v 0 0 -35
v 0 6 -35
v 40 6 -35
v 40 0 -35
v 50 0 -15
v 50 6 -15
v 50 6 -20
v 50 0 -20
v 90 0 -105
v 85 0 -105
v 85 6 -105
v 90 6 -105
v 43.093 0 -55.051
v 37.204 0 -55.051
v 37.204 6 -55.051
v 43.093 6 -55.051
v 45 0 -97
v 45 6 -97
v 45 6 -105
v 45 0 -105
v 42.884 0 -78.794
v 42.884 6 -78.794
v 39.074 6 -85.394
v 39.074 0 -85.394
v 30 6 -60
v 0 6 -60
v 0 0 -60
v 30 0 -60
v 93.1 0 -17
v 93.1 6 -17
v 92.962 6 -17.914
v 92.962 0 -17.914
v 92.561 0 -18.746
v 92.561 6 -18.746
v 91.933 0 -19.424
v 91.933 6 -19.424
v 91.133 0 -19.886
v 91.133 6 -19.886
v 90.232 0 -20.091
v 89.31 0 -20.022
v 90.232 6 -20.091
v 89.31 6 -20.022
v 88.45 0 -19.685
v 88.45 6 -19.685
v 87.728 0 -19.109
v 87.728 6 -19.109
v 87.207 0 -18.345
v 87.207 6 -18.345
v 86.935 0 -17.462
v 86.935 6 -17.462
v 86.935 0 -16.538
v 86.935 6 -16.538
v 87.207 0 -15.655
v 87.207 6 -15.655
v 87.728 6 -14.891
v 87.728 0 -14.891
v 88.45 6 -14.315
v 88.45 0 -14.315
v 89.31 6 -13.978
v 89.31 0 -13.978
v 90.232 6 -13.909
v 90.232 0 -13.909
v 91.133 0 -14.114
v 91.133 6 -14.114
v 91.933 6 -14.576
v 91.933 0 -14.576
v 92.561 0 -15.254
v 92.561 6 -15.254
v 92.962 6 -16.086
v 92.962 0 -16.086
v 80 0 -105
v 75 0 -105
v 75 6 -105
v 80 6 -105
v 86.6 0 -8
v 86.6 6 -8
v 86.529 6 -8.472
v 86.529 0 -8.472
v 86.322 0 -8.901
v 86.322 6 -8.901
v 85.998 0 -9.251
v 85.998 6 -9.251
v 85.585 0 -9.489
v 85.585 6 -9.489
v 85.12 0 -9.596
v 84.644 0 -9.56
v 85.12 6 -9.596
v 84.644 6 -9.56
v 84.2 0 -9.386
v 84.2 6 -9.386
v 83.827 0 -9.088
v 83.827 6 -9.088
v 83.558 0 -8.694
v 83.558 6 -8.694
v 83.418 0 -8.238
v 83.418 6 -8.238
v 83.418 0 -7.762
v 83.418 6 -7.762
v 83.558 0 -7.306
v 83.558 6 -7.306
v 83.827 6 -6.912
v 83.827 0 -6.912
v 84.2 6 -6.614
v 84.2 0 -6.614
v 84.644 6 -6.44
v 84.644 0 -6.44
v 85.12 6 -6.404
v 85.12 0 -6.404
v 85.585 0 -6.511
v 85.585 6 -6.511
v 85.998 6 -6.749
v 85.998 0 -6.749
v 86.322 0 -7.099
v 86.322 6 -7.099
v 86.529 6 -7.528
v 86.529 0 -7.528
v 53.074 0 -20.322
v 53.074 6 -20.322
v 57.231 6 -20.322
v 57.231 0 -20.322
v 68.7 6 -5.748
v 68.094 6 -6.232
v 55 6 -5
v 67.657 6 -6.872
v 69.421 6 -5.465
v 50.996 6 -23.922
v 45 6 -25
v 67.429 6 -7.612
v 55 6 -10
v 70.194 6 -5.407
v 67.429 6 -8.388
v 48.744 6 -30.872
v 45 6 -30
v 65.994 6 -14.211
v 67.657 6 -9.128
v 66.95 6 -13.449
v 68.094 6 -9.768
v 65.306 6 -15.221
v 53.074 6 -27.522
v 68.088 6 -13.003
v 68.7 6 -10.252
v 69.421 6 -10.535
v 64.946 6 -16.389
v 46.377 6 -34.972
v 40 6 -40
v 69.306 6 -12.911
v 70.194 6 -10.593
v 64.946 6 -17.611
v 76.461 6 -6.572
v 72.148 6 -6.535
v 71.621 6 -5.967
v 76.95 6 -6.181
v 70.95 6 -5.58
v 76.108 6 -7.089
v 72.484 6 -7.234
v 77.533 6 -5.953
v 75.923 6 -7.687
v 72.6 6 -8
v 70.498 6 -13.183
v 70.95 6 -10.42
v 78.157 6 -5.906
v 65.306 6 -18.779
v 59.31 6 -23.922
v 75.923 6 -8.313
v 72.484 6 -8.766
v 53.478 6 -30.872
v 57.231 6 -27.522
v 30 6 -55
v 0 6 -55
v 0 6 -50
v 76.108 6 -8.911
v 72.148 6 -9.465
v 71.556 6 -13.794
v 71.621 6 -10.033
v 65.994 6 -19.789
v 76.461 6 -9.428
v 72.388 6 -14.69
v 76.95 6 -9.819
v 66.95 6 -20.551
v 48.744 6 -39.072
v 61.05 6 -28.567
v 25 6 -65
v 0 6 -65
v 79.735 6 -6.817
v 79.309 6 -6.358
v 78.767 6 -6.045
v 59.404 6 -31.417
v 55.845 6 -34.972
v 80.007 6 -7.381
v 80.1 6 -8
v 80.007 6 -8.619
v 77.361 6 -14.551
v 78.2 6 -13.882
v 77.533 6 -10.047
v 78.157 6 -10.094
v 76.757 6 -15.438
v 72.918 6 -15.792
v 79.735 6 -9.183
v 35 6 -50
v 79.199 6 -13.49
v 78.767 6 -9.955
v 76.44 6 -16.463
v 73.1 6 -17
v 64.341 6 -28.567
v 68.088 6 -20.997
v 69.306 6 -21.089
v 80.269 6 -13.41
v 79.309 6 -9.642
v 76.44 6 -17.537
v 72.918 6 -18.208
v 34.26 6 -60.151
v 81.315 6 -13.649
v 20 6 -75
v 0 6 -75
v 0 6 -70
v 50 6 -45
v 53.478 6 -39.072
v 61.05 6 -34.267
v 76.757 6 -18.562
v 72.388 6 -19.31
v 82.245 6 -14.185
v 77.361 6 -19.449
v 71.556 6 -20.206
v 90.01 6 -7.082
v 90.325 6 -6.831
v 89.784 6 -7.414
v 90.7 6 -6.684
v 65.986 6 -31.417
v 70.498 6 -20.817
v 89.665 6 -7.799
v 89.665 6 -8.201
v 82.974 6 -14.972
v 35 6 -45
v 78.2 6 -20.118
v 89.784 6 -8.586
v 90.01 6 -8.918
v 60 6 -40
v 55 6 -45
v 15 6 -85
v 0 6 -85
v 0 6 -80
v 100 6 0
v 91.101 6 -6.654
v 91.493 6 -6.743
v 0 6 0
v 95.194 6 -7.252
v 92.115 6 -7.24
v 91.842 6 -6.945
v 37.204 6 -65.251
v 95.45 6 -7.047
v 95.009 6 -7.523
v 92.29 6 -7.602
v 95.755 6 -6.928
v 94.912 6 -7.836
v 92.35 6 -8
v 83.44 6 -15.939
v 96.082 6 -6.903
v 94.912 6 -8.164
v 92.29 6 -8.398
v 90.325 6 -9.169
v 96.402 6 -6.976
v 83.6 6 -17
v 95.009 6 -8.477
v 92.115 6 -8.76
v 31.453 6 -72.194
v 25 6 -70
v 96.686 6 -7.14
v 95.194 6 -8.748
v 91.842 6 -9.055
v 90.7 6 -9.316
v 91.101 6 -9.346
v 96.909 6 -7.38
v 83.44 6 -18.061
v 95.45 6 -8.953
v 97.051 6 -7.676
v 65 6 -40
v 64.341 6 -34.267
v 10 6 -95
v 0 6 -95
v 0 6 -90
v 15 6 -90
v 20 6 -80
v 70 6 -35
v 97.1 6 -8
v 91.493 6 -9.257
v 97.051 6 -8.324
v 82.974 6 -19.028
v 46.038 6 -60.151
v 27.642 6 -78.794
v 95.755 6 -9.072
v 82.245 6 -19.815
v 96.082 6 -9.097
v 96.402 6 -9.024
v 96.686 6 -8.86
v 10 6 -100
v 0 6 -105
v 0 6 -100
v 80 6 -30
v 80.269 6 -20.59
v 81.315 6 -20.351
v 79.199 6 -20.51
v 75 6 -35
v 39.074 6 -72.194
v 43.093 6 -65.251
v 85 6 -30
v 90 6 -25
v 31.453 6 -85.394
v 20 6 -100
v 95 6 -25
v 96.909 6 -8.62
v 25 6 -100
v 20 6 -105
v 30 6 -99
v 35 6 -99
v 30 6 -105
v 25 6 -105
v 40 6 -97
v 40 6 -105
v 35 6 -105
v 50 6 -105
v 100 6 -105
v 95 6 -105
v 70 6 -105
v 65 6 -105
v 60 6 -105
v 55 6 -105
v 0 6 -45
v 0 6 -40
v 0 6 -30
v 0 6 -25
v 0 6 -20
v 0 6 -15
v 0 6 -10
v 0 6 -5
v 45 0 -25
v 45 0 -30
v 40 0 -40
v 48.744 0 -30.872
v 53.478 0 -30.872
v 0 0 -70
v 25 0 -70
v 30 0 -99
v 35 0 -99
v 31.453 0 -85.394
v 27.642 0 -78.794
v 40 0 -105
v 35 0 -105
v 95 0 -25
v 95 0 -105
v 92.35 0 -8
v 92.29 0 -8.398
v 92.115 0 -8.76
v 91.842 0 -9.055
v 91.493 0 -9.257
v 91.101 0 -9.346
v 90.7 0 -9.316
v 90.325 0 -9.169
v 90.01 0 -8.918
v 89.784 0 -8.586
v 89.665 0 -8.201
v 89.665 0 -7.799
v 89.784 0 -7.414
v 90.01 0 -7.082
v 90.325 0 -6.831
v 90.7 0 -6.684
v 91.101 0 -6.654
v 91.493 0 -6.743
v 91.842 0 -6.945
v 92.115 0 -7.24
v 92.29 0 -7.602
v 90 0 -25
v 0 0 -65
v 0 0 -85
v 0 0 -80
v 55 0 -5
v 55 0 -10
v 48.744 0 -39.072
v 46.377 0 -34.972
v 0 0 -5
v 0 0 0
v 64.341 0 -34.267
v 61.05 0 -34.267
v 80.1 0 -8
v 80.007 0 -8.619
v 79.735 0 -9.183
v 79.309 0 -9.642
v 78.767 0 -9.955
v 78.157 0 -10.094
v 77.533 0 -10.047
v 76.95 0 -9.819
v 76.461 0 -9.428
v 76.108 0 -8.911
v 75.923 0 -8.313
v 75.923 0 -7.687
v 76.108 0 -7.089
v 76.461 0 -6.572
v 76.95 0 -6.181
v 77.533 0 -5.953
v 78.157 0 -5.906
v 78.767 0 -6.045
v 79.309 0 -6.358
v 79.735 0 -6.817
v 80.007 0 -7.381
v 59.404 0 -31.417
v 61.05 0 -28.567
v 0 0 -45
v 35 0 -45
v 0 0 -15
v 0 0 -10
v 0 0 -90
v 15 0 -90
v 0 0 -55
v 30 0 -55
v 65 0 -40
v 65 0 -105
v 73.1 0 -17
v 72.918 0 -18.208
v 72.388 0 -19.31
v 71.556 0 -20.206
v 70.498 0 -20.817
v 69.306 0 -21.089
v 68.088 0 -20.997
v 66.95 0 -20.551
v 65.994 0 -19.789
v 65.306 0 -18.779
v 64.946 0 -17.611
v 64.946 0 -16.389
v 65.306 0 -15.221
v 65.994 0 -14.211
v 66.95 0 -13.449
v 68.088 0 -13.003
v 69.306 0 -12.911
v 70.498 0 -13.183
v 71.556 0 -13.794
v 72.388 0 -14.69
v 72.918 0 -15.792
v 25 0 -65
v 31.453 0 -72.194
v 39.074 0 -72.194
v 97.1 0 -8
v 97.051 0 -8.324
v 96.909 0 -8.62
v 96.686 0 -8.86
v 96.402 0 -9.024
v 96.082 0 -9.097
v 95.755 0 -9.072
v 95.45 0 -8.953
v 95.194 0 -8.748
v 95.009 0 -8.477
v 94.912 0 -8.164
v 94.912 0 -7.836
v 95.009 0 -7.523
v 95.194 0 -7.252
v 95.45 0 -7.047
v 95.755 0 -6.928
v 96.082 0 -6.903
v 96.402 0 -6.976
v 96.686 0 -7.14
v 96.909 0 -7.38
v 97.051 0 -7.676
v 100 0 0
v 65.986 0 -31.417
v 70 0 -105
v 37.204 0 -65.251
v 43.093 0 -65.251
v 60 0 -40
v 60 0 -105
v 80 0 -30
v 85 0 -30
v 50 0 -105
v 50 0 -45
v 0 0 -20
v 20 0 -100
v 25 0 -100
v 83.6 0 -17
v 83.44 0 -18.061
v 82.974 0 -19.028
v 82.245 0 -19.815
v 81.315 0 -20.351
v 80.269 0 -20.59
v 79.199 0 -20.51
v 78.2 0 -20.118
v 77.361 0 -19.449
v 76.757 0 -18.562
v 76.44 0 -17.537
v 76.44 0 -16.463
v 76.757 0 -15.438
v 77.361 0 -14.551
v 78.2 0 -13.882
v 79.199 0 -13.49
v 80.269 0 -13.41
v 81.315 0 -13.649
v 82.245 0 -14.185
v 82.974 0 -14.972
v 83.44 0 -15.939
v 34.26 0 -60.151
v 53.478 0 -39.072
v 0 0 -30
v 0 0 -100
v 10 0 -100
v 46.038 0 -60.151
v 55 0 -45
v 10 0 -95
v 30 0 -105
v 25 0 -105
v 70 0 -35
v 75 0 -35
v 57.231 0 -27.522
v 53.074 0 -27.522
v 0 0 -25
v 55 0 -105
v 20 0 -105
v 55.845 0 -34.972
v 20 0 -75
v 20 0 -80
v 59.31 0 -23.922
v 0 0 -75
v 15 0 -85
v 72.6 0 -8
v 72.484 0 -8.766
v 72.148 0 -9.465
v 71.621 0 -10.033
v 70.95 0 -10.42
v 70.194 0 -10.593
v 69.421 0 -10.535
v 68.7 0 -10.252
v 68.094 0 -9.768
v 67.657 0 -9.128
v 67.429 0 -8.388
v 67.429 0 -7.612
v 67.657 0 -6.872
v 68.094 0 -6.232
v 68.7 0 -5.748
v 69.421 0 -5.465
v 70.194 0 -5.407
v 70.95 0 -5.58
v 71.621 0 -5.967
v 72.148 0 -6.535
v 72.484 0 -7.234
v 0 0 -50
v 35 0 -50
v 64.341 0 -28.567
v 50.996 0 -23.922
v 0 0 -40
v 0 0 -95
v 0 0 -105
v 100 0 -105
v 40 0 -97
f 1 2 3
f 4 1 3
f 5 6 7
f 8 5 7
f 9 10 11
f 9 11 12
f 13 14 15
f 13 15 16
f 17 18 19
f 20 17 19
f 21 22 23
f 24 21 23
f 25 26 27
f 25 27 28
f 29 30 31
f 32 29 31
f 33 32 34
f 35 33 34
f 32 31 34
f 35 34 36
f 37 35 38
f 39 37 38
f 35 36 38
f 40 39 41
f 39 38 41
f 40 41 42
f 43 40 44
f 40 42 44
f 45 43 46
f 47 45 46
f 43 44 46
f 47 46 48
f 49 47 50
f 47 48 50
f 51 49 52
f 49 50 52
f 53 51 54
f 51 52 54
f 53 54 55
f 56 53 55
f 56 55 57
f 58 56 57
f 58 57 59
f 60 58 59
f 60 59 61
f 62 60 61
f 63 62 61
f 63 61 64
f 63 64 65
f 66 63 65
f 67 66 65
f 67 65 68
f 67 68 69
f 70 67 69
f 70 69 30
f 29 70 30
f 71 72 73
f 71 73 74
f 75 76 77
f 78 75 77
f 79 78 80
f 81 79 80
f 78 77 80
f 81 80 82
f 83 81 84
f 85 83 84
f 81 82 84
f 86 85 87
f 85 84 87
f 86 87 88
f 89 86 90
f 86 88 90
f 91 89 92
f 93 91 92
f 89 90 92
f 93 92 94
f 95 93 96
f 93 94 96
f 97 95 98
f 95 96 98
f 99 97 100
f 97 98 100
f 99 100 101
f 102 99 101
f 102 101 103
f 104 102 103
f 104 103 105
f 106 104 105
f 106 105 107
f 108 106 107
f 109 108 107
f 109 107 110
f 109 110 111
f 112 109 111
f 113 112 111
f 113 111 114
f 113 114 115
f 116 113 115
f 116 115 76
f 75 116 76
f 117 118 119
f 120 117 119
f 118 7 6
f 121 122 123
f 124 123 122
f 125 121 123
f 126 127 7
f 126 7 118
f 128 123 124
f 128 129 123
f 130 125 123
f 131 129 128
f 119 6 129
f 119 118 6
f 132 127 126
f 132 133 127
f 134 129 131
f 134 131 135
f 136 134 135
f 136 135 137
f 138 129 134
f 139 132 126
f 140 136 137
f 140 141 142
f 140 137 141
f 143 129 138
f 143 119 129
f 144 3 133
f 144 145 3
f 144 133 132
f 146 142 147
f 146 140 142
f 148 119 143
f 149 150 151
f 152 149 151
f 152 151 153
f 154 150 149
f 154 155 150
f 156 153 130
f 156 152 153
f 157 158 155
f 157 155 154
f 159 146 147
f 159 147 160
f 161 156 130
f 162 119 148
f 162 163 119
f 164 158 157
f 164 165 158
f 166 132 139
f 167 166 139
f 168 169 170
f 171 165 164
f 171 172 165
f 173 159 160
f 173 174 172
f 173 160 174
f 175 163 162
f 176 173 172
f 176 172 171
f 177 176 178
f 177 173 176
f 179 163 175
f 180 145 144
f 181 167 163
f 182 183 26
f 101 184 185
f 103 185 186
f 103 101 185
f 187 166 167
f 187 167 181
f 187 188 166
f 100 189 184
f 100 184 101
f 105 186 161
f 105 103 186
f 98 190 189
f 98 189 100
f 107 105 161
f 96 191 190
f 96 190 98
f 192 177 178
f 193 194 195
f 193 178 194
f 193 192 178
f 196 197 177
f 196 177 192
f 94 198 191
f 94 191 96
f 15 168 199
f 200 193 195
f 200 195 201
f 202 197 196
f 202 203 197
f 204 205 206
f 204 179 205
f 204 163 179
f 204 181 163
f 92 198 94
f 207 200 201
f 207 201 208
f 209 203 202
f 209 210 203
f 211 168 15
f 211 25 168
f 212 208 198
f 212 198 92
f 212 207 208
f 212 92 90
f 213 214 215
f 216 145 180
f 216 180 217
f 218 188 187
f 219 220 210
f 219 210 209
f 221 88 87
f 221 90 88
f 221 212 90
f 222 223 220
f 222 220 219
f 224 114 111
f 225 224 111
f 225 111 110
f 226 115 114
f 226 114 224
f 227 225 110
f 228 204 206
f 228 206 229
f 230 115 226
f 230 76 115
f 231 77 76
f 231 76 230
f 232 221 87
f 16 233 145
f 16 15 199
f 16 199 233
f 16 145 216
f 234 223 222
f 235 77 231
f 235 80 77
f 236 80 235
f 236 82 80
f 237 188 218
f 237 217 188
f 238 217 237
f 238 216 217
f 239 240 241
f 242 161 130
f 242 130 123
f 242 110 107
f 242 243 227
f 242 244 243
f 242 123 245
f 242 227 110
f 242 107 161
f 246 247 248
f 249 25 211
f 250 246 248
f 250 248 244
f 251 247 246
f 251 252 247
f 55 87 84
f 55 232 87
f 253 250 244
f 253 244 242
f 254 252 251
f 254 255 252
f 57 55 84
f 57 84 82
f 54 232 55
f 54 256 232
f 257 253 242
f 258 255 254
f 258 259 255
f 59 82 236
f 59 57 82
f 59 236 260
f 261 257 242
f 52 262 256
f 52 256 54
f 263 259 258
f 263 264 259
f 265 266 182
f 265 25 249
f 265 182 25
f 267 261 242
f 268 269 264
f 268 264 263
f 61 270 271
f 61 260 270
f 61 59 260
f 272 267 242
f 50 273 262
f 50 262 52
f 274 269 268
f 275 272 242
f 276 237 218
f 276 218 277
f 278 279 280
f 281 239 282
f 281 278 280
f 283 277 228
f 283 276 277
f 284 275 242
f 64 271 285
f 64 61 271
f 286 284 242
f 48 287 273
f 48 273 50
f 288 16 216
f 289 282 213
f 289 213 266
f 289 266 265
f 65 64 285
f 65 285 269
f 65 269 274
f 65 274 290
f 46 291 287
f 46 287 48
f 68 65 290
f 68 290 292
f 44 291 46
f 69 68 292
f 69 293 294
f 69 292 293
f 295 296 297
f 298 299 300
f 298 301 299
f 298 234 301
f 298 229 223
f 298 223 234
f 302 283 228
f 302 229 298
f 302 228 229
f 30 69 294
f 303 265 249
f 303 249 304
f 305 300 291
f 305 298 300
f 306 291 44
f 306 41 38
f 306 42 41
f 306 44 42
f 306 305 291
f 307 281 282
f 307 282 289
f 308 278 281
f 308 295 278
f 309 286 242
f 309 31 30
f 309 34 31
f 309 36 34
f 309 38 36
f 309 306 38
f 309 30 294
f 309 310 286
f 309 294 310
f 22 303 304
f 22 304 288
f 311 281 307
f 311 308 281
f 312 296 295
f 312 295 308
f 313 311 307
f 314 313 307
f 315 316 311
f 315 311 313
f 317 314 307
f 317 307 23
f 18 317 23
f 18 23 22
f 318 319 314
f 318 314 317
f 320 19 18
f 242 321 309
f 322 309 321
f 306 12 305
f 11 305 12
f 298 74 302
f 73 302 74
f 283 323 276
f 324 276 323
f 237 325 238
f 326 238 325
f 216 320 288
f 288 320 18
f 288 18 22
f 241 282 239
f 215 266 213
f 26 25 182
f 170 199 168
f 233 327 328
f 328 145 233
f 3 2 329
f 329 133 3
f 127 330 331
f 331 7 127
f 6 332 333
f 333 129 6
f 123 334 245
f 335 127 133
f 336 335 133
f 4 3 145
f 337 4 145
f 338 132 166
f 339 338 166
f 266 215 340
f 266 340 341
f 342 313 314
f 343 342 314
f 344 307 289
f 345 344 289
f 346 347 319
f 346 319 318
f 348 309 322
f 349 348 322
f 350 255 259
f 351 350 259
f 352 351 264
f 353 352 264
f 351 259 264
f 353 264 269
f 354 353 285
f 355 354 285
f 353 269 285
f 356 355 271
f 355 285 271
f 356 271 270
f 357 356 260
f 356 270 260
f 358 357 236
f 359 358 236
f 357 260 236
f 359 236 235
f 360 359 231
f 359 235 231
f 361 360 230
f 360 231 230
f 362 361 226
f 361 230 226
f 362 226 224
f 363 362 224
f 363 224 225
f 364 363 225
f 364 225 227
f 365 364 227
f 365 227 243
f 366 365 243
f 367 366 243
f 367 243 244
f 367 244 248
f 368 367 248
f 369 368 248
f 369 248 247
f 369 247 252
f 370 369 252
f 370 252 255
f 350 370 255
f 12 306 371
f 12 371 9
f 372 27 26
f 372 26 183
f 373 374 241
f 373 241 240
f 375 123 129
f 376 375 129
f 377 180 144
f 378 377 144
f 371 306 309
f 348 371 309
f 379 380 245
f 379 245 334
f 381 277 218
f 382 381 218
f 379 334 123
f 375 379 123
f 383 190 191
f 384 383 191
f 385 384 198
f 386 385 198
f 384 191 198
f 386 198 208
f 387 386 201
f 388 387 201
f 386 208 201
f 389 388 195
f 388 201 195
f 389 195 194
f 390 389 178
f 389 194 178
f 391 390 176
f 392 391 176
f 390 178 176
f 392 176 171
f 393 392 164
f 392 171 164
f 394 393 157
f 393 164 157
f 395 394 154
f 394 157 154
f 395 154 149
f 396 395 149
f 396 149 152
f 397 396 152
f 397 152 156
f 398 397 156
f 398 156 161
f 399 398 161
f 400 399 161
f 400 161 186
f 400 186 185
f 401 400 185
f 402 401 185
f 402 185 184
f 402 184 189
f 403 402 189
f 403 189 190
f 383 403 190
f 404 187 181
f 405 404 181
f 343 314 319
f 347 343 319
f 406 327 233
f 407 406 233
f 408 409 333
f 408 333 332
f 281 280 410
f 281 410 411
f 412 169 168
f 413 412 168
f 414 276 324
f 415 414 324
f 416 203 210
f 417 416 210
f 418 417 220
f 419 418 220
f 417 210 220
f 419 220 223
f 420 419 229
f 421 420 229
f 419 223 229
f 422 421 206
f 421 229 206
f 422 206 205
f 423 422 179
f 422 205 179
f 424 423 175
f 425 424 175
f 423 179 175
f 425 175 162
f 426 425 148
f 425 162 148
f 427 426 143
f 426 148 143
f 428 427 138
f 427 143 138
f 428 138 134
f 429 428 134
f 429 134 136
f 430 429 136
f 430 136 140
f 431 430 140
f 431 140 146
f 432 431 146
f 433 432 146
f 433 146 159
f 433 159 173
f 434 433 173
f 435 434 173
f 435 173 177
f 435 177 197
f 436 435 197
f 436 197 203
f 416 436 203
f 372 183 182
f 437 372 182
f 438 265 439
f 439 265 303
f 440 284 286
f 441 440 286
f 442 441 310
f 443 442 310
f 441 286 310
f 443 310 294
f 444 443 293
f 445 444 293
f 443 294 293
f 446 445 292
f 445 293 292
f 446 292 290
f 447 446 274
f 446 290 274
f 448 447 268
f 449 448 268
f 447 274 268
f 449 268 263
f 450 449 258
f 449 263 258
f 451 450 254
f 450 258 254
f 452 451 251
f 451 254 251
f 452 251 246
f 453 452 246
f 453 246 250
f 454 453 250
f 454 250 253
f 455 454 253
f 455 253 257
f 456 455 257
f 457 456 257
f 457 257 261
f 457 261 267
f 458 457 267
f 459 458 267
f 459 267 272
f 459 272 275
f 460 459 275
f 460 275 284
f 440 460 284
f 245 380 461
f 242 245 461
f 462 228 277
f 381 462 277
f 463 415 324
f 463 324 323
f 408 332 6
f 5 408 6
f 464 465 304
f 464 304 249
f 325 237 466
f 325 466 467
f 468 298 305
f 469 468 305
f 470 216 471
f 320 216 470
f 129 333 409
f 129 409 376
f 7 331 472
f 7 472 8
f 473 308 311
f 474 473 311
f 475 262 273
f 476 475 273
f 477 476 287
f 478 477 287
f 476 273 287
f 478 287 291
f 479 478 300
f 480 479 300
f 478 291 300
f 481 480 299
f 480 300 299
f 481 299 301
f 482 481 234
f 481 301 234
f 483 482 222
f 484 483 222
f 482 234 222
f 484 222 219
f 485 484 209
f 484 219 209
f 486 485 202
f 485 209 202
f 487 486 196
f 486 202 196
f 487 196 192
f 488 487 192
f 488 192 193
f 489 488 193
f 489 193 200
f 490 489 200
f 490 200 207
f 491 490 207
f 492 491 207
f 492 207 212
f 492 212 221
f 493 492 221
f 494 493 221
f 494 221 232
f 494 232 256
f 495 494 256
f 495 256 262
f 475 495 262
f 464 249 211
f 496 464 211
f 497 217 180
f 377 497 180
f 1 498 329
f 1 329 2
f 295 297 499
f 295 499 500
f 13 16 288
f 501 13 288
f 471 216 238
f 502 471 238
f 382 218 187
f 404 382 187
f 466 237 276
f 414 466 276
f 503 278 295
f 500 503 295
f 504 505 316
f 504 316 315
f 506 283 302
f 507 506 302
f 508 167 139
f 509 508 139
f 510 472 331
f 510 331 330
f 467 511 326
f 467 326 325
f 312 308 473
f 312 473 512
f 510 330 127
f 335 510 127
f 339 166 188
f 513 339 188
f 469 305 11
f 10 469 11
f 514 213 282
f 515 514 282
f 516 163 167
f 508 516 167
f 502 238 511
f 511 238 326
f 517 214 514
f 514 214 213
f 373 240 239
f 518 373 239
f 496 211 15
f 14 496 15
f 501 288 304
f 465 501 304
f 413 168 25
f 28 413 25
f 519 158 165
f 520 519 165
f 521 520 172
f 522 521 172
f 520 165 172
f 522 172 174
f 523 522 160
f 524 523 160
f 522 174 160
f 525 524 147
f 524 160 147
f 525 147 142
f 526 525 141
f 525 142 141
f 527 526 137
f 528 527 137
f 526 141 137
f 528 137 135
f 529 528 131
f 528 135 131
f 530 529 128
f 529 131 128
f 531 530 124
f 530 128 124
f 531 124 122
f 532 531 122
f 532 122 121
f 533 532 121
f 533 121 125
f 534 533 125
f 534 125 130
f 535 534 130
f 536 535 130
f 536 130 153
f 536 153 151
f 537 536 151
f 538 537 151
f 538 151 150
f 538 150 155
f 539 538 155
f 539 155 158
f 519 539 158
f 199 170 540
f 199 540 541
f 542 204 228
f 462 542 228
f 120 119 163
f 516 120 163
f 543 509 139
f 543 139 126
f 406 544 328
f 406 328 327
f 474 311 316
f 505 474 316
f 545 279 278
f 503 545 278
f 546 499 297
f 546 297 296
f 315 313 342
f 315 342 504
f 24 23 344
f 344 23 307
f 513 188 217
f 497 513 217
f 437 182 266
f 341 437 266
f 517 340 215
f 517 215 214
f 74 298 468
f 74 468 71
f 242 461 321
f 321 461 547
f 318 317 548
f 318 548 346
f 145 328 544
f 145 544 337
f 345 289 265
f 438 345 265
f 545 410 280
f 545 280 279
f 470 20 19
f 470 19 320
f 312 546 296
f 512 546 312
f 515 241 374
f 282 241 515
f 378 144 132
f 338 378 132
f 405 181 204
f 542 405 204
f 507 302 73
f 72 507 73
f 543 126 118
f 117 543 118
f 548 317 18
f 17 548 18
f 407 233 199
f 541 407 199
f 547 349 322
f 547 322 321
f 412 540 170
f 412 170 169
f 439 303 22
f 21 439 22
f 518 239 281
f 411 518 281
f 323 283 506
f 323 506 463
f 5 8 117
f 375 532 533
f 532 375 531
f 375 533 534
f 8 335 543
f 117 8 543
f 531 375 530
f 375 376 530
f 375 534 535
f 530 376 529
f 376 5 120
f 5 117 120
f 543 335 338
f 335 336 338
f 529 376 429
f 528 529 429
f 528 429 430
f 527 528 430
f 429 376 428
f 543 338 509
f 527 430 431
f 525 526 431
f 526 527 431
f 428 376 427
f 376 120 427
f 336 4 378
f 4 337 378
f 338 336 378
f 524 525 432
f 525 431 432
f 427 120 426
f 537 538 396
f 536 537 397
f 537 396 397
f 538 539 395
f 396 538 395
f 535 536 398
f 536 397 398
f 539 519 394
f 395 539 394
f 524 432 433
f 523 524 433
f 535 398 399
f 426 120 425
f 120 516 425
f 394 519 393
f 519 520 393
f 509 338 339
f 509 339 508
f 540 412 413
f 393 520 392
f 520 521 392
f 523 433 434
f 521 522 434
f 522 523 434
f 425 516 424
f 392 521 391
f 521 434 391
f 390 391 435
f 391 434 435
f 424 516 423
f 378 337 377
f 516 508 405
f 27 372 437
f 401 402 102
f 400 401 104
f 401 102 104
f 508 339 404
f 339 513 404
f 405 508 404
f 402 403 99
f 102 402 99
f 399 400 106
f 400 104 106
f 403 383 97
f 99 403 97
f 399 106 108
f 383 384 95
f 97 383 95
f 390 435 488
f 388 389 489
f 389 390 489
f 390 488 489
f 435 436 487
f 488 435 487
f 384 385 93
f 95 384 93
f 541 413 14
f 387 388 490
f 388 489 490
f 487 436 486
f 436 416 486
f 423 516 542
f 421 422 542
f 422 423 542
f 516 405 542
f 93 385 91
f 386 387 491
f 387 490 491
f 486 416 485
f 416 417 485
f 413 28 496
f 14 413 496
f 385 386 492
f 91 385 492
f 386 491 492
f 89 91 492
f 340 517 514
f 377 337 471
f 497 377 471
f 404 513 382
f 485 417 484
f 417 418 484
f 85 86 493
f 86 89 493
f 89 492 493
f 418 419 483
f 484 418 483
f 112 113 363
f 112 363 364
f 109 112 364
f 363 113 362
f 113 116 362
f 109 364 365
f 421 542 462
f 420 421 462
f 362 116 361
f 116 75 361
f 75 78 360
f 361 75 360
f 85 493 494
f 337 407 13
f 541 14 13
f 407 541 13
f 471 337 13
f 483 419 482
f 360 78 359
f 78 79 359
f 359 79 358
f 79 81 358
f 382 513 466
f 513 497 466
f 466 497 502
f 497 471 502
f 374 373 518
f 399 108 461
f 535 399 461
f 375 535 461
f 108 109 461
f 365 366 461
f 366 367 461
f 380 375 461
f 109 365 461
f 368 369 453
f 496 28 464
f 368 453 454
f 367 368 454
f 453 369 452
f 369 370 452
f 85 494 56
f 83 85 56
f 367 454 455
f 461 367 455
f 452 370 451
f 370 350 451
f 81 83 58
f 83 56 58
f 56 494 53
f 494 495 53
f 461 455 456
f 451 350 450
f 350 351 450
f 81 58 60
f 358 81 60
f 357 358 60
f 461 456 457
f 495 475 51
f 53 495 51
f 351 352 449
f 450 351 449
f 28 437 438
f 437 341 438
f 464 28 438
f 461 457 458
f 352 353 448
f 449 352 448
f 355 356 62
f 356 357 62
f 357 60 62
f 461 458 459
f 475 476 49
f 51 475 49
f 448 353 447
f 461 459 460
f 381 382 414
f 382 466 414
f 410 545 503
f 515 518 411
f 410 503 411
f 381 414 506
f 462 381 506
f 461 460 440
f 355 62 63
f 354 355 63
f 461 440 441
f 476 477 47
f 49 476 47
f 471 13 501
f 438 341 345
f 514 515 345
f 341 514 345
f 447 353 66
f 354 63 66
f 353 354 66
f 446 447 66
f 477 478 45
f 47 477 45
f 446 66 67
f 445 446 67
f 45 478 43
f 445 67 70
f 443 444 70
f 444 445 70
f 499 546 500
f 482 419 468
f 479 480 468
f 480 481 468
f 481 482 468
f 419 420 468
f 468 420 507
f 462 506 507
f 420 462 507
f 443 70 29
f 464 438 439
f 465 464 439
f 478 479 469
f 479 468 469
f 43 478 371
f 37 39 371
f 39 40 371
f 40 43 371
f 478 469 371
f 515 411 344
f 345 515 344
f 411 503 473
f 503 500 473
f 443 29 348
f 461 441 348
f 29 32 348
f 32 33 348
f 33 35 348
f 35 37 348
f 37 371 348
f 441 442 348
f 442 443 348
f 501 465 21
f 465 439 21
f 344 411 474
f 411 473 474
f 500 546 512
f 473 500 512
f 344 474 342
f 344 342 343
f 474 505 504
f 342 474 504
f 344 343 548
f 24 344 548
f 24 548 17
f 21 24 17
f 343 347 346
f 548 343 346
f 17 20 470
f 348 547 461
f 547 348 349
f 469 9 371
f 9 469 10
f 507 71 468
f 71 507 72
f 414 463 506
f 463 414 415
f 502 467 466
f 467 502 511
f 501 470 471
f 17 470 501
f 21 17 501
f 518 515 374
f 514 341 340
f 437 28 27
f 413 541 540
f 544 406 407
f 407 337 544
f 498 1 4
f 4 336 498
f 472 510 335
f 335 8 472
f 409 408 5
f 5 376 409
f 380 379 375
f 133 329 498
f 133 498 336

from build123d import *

# Parameters (mm, degrees)
SKETCH1_W           = 100
SKETCH1_H           = 105
BOSS_EXTRUDE1_DEPTH = 6
SKETCH3_W           = 10
SKETCH3_H           = 5
SKETCH3_W_2         = 15
SKETCH3_W_3         = 20
SKETCH3_W_4         = 25
SKETCH3_W_5         = 30
SKETCH3_W_6         = 35
SKETCH3_W_7         = 40
SKETCH3_W_8         = 45
SKETCH3_W_9         = 50
SKETCH3_W_10        = 55
CUT_EXTRUDE1_DEPTH  = 6
SKETCH4_W           = 5
SKETCH4_H           = 80
SKETCH4_H_2         = 75
SKETCH4_H_3         = 70
SKETCH4_H_4         = 65
SKETCH4_H_5         = 60
CUT_EXTRUDE2_DEPTH  = 6
SKETCH5_R           = 1.35
SKETCH5_R_2         = 1.6
SKETCH5_R_3         = 2.1
SKETCH5_R_4         = 2.6
SKETCH5_R_5         = 1.1
SKETCH5_R_6         = 3.1
SKETCH5_R_7         = 3.6
SKETCH5_R_8         = 4.1
CUT_EXTRUDE3_DEPTH  = 7
SKETCH7_W           = 5
SKETCH7_H           = 5
SKETCH7_H_2         = 6
SKETCH7_H_3         = 8
CUT_EXTRUDE4_DEPTH  = 7
CUT_EXTRUDE5_DEPTH  = 7


with BuildPart() as part:
    # Sketch1 → Boss-Extrude1 (new body)
    with BuildSketch(Plane(origin=(0, 0, 0), x_dir=(1, 0, 0), z_dir=(0, 1, 0))):
        with Locations((50, 52.5)):
            Rectangle(SKETCH1_W, SKETCH1_H)
    extrude(amount=BOSS_EXTRUDE1_DEPTH)

    # Sketch3 → Cut-Extrude1 (cut)
    with BuildSketch(Plane(origin=(0, 6, 0), x_dir=(1, 0, 0), z_dir=(0, 1, 0))):
        with Locations((5, 97.5)):
            Rectangle(SKETCH3_W, SKETCH3_H)
        with Locations((7.5, 87.5)):
            Rectangle(SKETCH3_W_2, SKETCH3_H)
        with Locations((10, 77.5)):
            Rectangle(SKETCH3_W_3, SKETCH3_H)
        with Locations((12.5, 67.5)):
            Rectangle(SKETCH3_W_4, SKETCH3_H)
        with Locations((15, 57.5)):
            Rectangle(SKETCH3_W_5, SKETCH3_H)
        with Locations((17.5, 47.5)):
            Rectangle(SKETCH3_W_6, SKETCH3_H)
        with Locations((20, 37.5)):
            Rectangle(SKETCH3_W_7, SKETCH3_H)
        with Locations((22.5, 27.5)):
            Rectangle(SKETCH3_W_8, SKETCH3_H)
        with Locations((25, 17.5)):
            Rectangle(SKETCH3_W_9, SKETCH3_H)
        with Locations((27.5, 7.5)):
            Rectangle(SKETCH3_W_10, SKETCH3_H)
    extrude(amount=-CUT_EXTRUDE1_DEPTH, mode=Mode.SUBTRACT)

    # Sketch4 → Cut-Extrude2 (cut)
    with BuildSketch(Plane(origin=(0, 6, 0), x_dir=(1, 0, 0), z_dir=(0, 1, 0))):
        with Locations((92.5, 65)):
            Rectangle(SKETCH4_W, SKETCH4_H)
        with Locations((82.5, 67.5)):
            Rectangle(SKETCH4_W, SKETCH4_H_2)
        with Locations((72.5, 70)):
            Rectangle(SKETCH4_W, SKETCH4_H_3)
        with Locations((62.5, 72.5)):
            Rectangle(SKETCH4_W, SKETCH4_H_4)
        with Locations((52.5, 75)):
            Rectangle(SKETCH4_W, SKETCH4_H_5)
    extrude(amount=-CUT_EXTRUDE2_DEPTH, mode=Mode.SUBTRACT)

    # Sketch5 → Cut-Extrude3 (cut, through all)
    with BuildSketch(Plane(origin=(0, 6, 0), x_dir=(1, 0, 0), z_dir=(0, 1, 0))):
        with Locations((91, 8)):
            Circle(SKETCH5_R)
        with Locations((85, 8)):
            Circle(SKETCH5_R_2)
        with Locations((78, 8)):
            Circle(SKETCH5_R_3)
        with Locations((70, 8)):
            Circle(SKETCH5_R_4)
        with Locations((96, 8)):
            Circle(SKETCH5_R_5)
        with Locations((90, 17)):
            Circle(SKETCH5_R_6)
        with Locations((80, 17)):
            Circle(SKETCH5_R_7)
        with Locations((69, 17)):
            Circle(SKETCH5_R_8)
    extrude(amount=-CUT_EXTRUDE3_DEPTH, mode=Mode.SUBTRACT)

    # Sketch7 → Cut-Extrude4 (cut, through all)
    with BuildSketch(Plane(origin=(0, 6, 0), x_dir=(1, 0, 0), z_dir=(0, 1, 0))):
        with Locations((22.5, 102.5)):
            Rectangle(SKETCH7_W, SKETCH7_H)
        with Locations((32.5, 102)):
            Rectangle(SKETCH7_W, SKETCH7_H_2)
        with Locations((42.5, 101)):
            Rectangle(SKETCH7_W, SKETCH7_H_3)
    extrude(amount=-CUT_EXTRUDE4_DEPTH, mode=Mode.SUBTRACT)

    # Sketch8 → Cut-Extrude5 (cut, through all)
    with BuildSketch(Plane(origin=(0, 6, 0), x_dir=(1, 0, 0), z_dir=(0, 1, 0))):
        Polygon((65.986104675, 31.416856683), (64.340656408, 34.266856683), (61.049759874, 34.266856683), (59.404311607, 31.416856683), (61.049759874, 28.566856683), (64.340656408, 28.566856683), align=None)
        Polygon((59.309574734, 23.921668245), (57.231113764, 27.521668245), (53.074191826, 27.521668245), (50.995730857, 23.921668245), (53.074191826, 20.321668245), (57.231113764, 20.321668245), align=None)
        Polygon((55.845473118, 34.972078883), (53.478337015, 39.072078883), (48.744064807, 39.072078883), (46.376928704, 34.972078883), (48.744064807, 30.872078883), (53.478337015, 30.872078883), align=None)
        Polygon((46.037567534, 60.151166507), (43.093081161, 65.251166507), (37.204108416, 65.251166507), (34.259622043, 60.151166507), (37.204108416, 55.051166507), (43.093081161, 55.051166507), align=None)
        Polygon((42.884078391, 78.793578101), (39.073566615, 85.393578101), (31.452543062, 85.393578101), (27.642031285, 78.793578101), (31.452543062, 72.193578101), (39.073566615, 72.193578101), align=None)
    extrude(amount=-CUT_EXTRUDE5_DEPTH, mode=Mode.SUBTRACT)


solid = part.part
